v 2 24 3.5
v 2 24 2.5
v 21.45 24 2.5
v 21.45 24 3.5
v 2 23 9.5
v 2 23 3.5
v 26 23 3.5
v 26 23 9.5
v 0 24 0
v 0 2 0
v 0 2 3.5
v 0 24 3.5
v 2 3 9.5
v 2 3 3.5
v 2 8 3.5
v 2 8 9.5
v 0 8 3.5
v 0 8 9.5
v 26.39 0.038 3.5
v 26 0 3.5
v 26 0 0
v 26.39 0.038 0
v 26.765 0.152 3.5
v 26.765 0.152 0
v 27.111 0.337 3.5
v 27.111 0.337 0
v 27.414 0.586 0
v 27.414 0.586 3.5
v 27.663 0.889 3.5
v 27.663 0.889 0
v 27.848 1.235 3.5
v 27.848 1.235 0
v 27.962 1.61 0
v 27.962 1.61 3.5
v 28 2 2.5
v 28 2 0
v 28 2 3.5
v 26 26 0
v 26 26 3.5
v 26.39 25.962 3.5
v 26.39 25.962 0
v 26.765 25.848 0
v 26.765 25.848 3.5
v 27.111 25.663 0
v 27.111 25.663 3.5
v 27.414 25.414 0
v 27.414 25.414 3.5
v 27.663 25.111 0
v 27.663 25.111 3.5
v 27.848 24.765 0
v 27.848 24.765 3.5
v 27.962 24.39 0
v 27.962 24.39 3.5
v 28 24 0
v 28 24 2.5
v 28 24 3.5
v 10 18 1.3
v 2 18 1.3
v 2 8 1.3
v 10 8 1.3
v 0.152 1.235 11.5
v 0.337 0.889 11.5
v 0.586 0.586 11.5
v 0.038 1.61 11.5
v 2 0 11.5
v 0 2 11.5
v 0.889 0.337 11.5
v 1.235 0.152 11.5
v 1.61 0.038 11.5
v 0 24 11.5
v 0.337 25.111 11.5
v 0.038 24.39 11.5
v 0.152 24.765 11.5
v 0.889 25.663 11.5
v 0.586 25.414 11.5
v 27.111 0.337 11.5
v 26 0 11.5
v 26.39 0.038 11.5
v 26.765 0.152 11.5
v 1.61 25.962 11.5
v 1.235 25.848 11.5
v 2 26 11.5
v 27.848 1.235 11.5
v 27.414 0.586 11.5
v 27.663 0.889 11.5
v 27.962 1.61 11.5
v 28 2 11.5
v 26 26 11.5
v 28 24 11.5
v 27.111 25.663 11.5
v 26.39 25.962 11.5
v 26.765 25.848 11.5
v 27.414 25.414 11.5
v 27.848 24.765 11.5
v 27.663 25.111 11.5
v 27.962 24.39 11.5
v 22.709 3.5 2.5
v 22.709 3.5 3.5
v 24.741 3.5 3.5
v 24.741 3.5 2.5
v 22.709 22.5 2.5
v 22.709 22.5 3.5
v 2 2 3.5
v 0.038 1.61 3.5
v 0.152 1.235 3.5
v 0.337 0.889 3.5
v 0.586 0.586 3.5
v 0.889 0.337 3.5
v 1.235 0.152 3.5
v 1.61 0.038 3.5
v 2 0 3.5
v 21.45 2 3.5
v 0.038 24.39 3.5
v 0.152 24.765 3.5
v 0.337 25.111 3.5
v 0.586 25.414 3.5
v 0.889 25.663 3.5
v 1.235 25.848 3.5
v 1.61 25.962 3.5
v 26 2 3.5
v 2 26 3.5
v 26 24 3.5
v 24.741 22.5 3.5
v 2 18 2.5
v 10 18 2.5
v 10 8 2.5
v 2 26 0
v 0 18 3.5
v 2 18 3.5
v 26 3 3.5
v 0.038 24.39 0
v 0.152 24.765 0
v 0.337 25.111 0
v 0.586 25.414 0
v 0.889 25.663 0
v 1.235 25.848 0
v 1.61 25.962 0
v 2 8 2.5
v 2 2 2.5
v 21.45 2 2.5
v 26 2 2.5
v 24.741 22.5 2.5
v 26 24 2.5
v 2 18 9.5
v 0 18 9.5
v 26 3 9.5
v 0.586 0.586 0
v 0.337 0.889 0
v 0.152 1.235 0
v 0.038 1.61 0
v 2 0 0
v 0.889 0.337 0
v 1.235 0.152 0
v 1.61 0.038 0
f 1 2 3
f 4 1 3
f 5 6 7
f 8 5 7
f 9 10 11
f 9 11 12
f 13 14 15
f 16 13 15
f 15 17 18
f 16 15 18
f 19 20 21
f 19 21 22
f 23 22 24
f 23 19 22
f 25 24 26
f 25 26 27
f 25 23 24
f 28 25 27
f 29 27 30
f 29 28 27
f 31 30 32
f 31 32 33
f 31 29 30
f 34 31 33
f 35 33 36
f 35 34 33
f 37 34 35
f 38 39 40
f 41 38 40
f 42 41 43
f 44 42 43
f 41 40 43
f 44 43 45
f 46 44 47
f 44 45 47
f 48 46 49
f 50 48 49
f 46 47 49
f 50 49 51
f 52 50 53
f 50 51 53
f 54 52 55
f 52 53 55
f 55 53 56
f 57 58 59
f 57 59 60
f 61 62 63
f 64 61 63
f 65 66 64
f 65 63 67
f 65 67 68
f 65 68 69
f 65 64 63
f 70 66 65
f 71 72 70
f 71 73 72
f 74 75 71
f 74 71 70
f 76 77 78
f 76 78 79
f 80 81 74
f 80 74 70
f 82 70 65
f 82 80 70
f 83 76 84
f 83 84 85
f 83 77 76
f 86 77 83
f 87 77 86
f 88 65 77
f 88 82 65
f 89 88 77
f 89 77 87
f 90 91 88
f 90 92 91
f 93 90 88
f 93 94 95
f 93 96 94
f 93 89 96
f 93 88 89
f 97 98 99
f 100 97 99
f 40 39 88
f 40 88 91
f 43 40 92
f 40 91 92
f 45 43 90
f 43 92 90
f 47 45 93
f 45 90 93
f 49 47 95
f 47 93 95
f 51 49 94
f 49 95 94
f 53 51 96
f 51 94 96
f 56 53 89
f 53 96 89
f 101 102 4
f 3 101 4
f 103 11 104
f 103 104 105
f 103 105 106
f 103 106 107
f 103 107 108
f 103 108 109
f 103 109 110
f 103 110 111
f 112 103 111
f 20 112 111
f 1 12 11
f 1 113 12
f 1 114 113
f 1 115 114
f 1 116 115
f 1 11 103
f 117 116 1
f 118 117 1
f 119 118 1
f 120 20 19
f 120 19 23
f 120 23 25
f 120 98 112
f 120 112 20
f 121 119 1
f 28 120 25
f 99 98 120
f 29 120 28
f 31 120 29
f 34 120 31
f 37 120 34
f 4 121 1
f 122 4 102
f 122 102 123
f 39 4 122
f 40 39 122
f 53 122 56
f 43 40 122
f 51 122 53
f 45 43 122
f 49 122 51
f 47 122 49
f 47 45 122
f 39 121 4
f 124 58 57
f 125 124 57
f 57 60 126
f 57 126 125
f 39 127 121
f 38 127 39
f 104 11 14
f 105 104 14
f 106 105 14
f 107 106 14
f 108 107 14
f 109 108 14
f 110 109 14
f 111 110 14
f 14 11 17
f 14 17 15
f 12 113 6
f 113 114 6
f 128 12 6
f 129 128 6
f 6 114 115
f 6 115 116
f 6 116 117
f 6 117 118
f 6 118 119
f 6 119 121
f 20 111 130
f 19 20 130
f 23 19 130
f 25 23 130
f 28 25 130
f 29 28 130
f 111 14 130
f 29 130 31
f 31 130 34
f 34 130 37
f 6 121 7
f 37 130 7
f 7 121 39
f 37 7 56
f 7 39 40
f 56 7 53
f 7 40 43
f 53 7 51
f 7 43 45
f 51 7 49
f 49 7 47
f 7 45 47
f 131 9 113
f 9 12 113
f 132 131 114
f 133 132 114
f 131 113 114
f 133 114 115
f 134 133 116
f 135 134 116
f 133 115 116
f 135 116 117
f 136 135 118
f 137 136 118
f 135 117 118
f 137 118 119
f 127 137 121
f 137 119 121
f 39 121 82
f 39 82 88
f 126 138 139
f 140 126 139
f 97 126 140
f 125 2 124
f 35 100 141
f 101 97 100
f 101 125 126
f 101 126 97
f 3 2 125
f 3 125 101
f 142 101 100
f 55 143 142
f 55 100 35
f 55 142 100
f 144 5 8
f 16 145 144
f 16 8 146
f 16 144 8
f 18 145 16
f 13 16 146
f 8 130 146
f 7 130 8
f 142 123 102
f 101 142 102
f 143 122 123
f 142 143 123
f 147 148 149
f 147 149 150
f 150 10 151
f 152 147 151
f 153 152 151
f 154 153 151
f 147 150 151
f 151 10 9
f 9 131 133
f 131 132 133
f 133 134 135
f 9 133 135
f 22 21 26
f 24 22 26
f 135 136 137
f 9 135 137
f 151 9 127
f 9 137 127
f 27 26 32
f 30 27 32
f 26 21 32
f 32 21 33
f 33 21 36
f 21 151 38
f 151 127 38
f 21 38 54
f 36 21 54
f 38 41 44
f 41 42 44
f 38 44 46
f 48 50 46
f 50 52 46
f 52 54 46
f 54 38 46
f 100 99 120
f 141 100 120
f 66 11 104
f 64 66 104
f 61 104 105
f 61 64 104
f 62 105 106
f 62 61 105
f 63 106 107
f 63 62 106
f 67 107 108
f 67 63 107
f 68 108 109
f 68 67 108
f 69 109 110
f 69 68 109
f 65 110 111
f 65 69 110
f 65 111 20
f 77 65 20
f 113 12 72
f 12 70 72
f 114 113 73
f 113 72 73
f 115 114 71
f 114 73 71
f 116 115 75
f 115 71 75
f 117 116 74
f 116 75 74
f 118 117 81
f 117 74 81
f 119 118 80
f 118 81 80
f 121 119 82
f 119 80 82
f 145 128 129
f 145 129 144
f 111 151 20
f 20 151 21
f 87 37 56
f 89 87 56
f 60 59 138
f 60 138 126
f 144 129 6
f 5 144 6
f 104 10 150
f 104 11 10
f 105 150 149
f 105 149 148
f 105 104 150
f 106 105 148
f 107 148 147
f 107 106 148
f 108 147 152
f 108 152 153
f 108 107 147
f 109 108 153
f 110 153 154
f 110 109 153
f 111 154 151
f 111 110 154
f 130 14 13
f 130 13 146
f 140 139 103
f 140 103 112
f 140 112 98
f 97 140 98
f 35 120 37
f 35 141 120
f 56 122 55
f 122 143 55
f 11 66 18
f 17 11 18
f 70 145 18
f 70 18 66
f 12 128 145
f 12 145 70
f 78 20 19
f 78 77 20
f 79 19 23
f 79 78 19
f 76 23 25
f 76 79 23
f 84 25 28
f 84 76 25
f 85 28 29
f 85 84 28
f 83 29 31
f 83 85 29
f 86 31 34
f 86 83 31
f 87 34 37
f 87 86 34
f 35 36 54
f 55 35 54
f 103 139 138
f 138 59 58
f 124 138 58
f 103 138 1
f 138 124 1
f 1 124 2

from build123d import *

# Parameters (mm, degrees)
BOX004_W        = 24
BOX004_H        = 20
BOX004_DEPTH    = 6
BOX003_W        = 28
BOX003_H        = 26
BOX003_DEPTH    = 8
SKETCH001_W     = 10
SKETCH001_H     = 6
POCKET001_DEPTH = 2
FILLET_R        = 2
BOX002_W        = 8
BOX002_H        = 10
BOX002_DEPTH    = 1.2
BOX001_W        = 26
BOX001_H        = 22
BOX001_DEPTH    = 1
POCKET_DEPTH    = 1
BOX_W           = 28
BOX_H           = 26
BOX_DEPTH       = 3.5
FILLET001_R     = 2


with BuildPart() as w_rfel004:
    # Box004 → Box004 (new body)
    with BuildSketch(Plane(origin=(2, 3, 3.5), x_dir=(1, 0, 0), z_dir=(0, 0, 1))):
        with Locations((12, 10)):
            Rectangle(BOX004_W, BOX004_H)
    extrude(amount=BOX004_DEPTH)


with BuildPart() as fillet_body:
    # Box003 → Box003 (new body)
    with BuildSketch(Plane.XY.offset(3.5)):
        with Locations((14, 13)):
            Rectangle(BOX003_W, BOX003_H)
    extrude(amount=BOX003_DEPTH)

    # Cut002: cut Würfel004
    add(w_rfel004.part, mode=Mode.SUBTRACT)

    # Sketch001 → Pocket001 (cut)
    with BuildSketch(Plane(origin=(0, 0, 0), x_dir=(0, -1, 0), z_dir=(-1, 0, 0))):
        with Locations((-13, 6.5)):
            Rectangle(SKETCH001_W, SKETCH001_H)
    extrude(amount=-POCKET001_DEPTH, mode=Mode.SUBTRACT)

    # Fillet
    fillet_edges = [fillet_body.edges().sort_by_distance(p)[0] for p in [
        (28, 26, 7.5),
        (0, 26, 7.5),
        (28, 0, 7.5),
        (0, 0, 7.5),
    ]]
    fillet(fillet_edges, radius=FILLET_R)


with BuildPart() as w_rfel002:
    # Box002 → Box002 (new body)
    with BuildSketch(Plane(origin=(2, 8, 1.3), x_dir=(1, 0, 0), z_dir=(0, 0, 1))):
        with Locations((4, 5)):
            Rectangle(BOX002_W, BOX002_H)
    extrude(amount=BOX002_DEPTH)


with BuildPart() as pocket:
    # Box001 → Box001 (new body)
    with BuildSketch(Plane(origin=(2, 2, 2.5), x_dir=(1, 0, 0), z_dir=(0, 0, 1))):
        with Locations((13, 11)):
            Rectangle(BOX001_W, BOX001_H)
    extrude(amount=BOX001_DEPTH)

    # Sketch → Pocket (cut)
    with BuildSketch(Plane(origin=(2, 2, 3.5), x_dir=(1, 0, 0), z_dir=(0, 0, 1))):
        Polygon((24, 22), (22.741351, 20.5), (20.708649, 20.5), (19.45, 22), align=None)
        Polygon((19.45, 0), (20.708649, 1.5), (22.741351, 1.5), (24, 0), align=None)
    extrude(amount=-POCKET_DEPTH, mode=Mode.SUBTRACT)


with BuildPart() as fillet001:
    # Box → Box (new body)
    with BuildSketch(Plane.XY):
        with Locations((14, 13)):
            Rectangle(BOX_W, BOX_H)
    extrude(amount=BOX_DEPTH)

    # Cut: cut Pocket
    add(pocket.part, mode=Mode.SUBTRACT)

    # Cut001: cut Würfel002
    add(w_rfel002.part, mode=Mode.SUBTRACT)

    # Fillet001
    fillet001_edges = [fillet001.edges().sort_by_distance(p)[0] for p in [
        (28, 26, 1.75),
        (28, 0, 1.75),
        (0, 0, 1.75),
        (0, 26, 1.75),
    ]]
    fillet(fillet001_edges, radius=FILLET001_R)


solid = Compound([fillet_body.part, fillet001.part])
